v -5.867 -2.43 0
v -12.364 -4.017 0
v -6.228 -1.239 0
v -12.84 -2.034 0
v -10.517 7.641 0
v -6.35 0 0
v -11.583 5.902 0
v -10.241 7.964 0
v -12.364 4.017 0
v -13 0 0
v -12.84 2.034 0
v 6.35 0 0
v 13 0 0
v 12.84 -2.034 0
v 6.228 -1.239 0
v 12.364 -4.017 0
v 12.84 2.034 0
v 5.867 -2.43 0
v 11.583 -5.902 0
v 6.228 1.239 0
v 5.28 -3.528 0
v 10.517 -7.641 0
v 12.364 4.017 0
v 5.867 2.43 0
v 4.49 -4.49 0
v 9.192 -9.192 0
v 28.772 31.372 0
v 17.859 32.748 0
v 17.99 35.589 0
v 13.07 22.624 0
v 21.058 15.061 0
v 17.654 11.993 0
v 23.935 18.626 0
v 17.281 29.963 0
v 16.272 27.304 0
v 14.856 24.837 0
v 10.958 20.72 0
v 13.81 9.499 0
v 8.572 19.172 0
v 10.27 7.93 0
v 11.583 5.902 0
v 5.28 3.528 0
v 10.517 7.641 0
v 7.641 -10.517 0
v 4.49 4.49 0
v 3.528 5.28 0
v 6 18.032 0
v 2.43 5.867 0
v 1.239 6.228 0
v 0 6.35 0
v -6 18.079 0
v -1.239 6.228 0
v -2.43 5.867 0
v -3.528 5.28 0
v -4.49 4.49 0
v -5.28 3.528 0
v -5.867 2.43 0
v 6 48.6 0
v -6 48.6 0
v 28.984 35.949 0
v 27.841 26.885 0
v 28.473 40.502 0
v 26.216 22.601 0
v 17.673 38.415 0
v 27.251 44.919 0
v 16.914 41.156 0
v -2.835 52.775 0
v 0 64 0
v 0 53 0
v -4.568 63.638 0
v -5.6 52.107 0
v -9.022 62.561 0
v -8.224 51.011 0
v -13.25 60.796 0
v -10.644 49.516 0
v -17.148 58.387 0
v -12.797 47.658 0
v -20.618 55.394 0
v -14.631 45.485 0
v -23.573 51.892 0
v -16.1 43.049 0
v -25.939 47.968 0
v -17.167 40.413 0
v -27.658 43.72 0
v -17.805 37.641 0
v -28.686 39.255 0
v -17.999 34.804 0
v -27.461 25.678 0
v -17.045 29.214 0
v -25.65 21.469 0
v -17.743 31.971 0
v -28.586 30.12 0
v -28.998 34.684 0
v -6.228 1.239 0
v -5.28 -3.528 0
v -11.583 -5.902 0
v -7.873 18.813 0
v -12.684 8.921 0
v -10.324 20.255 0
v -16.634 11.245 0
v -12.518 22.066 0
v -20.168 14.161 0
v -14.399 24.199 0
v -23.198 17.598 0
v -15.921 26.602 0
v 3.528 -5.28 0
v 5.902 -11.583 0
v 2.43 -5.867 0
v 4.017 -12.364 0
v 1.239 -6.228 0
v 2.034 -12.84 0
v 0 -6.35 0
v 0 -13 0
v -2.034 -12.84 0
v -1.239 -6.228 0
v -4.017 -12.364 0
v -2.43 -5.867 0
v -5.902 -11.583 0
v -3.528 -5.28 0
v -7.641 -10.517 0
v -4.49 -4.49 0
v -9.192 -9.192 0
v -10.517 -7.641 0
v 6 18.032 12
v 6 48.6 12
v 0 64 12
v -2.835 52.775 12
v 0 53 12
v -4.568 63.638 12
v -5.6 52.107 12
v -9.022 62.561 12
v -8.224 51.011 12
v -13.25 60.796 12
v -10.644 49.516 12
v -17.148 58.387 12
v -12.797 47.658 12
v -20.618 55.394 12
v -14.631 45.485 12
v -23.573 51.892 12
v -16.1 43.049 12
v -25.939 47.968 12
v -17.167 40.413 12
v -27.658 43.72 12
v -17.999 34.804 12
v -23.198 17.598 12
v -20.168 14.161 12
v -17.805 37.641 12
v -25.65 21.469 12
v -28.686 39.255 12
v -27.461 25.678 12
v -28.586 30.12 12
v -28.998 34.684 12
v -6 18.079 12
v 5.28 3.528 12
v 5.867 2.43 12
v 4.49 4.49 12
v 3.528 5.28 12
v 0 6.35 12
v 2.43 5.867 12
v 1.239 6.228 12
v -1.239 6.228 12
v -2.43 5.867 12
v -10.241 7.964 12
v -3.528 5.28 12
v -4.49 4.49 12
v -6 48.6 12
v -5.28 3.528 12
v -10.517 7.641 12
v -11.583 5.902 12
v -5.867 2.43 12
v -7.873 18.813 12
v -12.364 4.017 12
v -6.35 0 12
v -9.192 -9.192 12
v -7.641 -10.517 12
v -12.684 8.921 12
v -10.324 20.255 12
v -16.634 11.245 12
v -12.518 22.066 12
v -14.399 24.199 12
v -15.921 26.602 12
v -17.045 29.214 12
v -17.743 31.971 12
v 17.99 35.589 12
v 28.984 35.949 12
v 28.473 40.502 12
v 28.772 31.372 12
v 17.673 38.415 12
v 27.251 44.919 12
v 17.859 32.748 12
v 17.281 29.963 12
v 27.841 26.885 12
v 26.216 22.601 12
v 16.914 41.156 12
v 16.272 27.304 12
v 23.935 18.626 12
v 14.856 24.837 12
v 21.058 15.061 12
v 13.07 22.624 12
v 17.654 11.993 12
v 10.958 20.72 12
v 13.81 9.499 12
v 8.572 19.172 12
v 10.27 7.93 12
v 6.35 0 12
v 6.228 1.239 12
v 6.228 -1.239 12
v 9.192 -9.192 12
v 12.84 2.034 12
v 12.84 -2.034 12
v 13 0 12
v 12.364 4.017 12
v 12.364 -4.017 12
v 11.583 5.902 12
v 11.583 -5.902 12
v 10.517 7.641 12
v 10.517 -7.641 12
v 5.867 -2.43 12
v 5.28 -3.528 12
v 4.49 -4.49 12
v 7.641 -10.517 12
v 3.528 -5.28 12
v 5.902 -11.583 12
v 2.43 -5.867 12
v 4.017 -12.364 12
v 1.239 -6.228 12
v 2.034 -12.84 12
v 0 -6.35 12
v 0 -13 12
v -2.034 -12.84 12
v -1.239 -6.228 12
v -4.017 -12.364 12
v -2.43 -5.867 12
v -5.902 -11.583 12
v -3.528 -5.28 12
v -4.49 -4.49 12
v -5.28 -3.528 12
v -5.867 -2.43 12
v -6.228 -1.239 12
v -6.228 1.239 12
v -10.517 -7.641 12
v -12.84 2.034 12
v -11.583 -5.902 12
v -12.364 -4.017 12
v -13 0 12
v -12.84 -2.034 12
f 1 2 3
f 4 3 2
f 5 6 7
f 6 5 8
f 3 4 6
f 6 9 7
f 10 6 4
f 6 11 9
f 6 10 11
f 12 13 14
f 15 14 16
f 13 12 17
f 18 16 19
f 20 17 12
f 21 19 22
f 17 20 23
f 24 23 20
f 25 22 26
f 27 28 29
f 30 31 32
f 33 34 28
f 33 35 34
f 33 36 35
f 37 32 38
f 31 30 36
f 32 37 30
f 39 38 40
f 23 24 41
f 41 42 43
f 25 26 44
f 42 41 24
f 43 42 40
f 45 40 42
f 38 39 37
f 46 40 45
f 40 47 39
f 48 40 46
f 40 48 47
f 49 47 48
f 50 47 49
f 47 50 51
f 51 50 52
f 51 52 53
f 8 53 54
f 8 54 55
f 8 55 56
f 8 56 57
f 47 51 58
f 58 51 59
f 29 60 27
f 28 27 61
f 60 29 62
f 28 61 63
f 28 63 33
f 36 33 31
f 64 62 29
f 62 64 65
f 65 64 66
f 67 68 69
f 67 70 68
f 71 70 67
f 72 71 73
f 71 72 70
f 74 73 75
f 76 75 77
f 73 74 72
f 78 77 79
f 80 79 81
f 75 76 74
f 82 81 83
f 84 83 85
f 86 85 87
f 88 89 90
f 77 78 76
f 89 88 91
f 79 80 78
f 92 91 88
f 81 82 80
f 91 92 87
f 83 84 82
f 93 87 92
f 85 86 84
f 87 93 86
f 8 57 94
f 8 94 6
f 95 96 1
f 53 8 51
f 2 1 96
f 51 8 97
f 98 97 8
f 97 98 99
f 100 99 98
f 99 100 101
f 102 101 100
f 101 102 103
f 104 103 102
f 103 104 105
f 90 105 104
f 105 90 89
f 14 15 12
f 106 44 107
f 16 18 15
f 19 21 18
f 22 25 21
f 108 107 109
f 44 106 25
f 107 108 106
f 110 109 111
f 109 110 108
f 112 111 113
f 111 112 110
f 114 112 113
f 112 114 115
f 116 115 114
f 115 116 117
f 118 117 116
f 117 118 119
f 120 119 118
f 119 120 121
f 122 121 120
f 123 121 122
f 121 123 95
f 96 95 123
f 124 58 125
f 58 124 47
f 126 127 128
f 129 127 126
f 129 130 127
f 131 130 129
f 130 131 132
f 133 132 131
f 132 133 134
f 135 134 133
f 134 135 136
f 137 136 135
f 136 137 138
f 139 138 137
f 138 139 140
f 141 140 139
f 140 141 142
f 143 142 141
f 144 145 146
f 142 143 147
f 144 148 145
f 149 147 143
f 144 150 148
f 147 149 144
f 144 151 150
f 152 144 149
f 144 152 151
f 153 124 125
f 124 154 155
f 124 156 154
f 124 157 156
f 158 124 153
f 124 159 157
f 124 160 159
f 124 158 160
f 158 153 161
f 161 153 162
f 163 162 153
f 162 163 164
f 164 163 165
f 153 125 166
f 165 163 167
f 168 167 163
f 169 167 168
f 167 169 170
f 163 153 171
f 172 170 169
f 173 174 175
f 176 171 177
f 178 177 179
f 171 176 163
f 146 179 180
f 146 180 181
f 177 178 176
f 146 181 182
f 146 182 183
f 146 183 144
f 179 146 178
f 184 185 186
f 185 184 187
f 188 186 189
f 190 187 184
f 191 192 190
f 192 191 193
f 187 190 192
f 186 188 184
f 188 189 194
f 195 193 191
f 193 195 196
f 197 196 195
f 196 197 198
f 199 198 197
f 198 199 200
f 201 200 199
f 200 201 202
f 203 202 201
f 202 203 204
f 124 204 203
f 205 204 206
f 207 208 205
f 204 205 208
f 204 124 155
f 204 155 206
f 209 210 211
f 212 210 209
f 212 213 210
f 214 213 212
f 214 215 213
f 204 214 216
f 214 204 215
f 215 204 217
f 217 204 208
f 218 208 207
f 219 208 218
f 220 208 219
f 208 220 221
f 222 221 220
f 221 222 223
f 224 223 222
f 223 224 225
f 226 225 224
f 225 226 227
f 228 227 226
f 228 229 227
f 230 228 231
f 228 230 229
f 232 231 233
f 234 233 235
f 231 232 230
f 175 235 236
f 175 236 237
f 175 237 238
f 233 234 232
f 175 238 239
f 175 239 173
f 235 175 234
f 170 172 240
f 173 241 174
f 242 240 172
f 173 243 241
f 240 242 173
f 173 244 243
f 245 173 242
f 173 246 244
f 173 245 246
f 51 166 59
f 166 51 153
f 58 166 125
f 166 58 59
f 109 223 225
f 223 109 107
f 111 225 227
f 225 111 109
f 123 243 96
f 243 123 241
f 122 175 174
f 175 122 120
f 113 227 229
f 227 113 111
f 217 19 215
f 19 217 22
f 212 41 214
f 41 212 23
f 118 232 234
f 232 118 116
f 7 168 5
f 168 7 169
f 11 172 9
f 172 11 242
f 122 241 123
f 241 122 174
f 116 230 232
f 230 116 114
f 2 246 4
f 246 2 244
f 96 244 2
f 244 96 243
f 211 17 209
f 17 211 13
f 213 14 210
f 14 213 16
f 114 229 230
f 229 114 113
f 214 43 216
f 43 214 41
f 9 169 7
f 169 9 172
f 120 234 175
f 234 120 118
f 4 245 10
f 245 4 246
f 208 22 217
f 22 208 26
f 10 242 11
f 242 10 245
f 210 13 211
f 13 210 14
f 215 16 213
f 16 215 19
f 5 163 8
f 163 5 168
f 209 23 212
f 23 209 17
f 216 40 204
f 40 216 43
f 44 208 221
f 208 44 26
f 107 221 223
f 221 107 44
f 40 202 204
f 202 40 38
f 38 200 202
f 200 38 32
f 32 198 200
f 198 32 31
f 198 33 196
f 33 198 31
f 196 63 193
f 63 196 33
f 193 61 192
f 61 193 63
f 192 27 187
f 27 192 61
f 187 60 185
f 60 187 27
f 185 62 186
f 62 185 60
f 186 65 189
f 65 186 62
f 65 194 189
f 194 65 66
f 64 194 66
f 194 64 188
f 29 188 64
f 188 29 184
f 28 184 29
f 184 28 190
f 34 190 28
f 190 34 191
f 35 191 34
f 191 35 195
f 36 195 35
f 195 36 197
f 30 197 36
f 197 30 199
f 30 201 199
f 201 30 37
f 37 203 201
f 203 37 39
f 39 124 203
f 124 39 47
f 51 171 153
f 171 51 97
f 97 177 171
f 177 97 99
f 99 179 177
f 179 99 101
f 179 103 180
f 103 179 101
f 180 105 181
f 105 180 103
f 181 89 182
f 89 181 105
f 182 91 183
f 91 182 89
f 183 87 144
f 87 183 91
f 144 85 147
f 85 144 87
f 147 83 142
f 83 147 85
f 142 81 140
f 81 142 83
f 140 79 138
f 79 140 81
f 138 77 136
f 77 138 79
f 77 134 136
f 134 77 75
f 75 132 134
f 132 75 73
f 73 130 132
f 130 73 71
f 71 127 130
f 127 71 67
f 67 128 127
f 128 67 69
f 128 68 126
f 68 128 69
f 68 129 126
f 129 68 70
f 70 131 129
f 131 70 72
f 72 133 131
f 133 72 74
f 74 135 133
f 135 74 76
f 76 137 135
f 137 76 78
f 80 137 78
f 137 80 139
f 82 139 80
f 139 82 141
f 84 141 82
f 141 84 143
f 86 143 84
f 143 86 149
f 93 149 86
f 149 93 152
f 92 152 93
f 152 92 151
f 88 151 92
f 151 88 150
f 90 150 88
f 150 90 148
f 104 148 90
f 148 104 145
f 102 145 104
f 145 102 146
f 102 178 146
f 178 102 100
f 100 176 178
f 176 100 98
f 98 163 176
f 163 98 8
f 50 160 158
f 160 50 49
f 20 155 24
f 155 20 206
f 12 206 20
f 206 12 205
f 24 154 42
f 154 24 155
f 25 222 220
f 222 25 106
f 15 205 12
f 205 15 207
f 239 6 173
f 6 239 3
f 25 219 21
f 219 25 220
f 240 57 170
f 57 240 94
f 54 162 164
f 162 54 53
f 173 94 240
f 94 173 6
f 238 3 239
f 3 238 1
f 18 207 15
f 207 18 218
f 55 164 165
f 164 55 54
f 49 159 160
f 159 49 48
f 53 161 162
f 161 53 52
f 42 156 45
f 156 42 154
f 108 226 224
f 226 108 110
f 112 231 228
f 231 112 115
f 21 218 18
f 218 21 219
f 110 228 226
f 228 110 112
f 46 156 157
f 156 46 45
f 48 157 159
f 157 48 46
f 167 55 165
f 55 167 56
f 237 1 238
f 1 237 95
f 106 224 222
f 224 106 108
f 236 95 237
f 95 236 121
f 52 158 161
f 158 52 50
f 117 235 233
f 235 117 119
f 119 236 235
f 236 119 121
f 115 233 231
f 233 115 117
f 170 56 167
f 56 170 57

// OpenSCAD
$fn = 32;

// ----------------------------------------------------------------------
// Hook: 70 mm shank into a 18 mm curl, 12 mm thick
// ----------------------------------------------------------------------

// --- parameters (mm) ---
shank_len = 70;           // shank length from the boss centre
shank_w = 12;             // shank width
boss_d = 26;              // boss diameter
bore_d = 12.7;            // boss bore
curl_in = 18;             // curl inner radius
curl_out = 29;            // curl outer radius
curl_sweep = 290;         // curl sweep angle
hook_t = 12;              // hook thickness

shank_profile = [[-6, 48.6], [6, 48.6], [6, 11], [-6, 11]];
boss_profile = [[13, 0], [12.84, 2.034], [12.364, 4.017], [11.583, 5.902], [10.517, 7.641], [9.192, 9.192], [7.641, 10.517], [5.902, 11.583], [4.017, 12.364], [2.034, 12.84], [0, 13], [-2.034, 12.84], [-4.017, 12.364], [-5.902, 11.583], [-7.641, 10.517], [-9.192, 9.192], [-10.517, 7.641], [-11.583, 5.902], [-12.364, 4.017], [-12.84, 2.034], [-13, 0], [-12.84, -2.034], [-12.364, -4.017], [-11.583, -5.902], [-10.517, -7.641], [-9.192, -9.192], [-7.641, -10.517], [-5.902, -11.583], [-4.017, -12.364], [-2.034, -12.84], [0, -13], [2.034, -12.84], [4.017, -12.364], [5.902, -11.583], [7.641, -10.517], [9.192, -9.192], [10.517, -7.641], [11.583, -5.902], [12.364, -4.017], [12.84, -2.034]];
curl_profile = [[0, 64], [-4.568, 63.638], [-9.022, 62.561], [-13.25, 60.796], [-17.148, 58.387], [-20.618, 55.394], [-23.573, 51.892], [-25.939, 47.968], [-27.658, 43.72], [-28.686, 39.255], [-28.998, 34.684], [-28.586, 30.12], [-27.461, 25.678], [-25.65, 21.469], [-23.198, 17.598], [-20.168, 14.161], [-16.634, 11.245], [-12.684, 8.921], [-8.418, 7.249], [-3.942, 6.269], [0.633, 6.007], [5.191, 6.468], [9.621, 7.642], [13.81, 9.499], [17.654, 11.993], [21.058, 15.061], [23.935, 18.626], [26.216, 22.601], [27.841, 26.885], [28.772, 31.372], [28.984, 35.949], [28.473, 40.502], [27.251, 44.919], [16.914, 41.156], [17.673, 38.415], [17.99, 35.589], [17.859, 32.748], [17.281, 29.963], [16.272, 27.304], [14.856, 24.837], [13.07, 22.624], [10.958, 20.72], [8.572, 19.172], [5.971, 18.019], [3.222, 17.291], [0.393, 17.004], [-2.447, 17.167], [-5.225, 17.775], [-7.873, 18.813], [-10.324, 20.255], [-12.518, 22.066], [-14.399, 24.199], [-15.921, 26.602], [-17.045, 29.214], [-17.743, 31.971], [-17.999, 34.804], [-17.805, 37.641], [-17.167, 40.413], [-16.1, 43.049], [-14.631, 45.485], [-12.797, 47.658], [-10.644, 49.516], [-8.224, 51.011], [-5.6, 52.107], [-2.835, 52.775], [0, 53]];

difference() {
  union() {
    /* three overlapping outlines: shank, boss and the smooth curl */
    linear_extrude(height = hook_t) polygon(shank_profile);
    linear_extrude(height = hook_t) polygon(boss_profile);
    linear_extrude(height = hook_t) polygon(curl_profile);
  }
  translate([0, 0, -2.5]) cylinder(h = hook_t + 5, d = bore_d);
}
